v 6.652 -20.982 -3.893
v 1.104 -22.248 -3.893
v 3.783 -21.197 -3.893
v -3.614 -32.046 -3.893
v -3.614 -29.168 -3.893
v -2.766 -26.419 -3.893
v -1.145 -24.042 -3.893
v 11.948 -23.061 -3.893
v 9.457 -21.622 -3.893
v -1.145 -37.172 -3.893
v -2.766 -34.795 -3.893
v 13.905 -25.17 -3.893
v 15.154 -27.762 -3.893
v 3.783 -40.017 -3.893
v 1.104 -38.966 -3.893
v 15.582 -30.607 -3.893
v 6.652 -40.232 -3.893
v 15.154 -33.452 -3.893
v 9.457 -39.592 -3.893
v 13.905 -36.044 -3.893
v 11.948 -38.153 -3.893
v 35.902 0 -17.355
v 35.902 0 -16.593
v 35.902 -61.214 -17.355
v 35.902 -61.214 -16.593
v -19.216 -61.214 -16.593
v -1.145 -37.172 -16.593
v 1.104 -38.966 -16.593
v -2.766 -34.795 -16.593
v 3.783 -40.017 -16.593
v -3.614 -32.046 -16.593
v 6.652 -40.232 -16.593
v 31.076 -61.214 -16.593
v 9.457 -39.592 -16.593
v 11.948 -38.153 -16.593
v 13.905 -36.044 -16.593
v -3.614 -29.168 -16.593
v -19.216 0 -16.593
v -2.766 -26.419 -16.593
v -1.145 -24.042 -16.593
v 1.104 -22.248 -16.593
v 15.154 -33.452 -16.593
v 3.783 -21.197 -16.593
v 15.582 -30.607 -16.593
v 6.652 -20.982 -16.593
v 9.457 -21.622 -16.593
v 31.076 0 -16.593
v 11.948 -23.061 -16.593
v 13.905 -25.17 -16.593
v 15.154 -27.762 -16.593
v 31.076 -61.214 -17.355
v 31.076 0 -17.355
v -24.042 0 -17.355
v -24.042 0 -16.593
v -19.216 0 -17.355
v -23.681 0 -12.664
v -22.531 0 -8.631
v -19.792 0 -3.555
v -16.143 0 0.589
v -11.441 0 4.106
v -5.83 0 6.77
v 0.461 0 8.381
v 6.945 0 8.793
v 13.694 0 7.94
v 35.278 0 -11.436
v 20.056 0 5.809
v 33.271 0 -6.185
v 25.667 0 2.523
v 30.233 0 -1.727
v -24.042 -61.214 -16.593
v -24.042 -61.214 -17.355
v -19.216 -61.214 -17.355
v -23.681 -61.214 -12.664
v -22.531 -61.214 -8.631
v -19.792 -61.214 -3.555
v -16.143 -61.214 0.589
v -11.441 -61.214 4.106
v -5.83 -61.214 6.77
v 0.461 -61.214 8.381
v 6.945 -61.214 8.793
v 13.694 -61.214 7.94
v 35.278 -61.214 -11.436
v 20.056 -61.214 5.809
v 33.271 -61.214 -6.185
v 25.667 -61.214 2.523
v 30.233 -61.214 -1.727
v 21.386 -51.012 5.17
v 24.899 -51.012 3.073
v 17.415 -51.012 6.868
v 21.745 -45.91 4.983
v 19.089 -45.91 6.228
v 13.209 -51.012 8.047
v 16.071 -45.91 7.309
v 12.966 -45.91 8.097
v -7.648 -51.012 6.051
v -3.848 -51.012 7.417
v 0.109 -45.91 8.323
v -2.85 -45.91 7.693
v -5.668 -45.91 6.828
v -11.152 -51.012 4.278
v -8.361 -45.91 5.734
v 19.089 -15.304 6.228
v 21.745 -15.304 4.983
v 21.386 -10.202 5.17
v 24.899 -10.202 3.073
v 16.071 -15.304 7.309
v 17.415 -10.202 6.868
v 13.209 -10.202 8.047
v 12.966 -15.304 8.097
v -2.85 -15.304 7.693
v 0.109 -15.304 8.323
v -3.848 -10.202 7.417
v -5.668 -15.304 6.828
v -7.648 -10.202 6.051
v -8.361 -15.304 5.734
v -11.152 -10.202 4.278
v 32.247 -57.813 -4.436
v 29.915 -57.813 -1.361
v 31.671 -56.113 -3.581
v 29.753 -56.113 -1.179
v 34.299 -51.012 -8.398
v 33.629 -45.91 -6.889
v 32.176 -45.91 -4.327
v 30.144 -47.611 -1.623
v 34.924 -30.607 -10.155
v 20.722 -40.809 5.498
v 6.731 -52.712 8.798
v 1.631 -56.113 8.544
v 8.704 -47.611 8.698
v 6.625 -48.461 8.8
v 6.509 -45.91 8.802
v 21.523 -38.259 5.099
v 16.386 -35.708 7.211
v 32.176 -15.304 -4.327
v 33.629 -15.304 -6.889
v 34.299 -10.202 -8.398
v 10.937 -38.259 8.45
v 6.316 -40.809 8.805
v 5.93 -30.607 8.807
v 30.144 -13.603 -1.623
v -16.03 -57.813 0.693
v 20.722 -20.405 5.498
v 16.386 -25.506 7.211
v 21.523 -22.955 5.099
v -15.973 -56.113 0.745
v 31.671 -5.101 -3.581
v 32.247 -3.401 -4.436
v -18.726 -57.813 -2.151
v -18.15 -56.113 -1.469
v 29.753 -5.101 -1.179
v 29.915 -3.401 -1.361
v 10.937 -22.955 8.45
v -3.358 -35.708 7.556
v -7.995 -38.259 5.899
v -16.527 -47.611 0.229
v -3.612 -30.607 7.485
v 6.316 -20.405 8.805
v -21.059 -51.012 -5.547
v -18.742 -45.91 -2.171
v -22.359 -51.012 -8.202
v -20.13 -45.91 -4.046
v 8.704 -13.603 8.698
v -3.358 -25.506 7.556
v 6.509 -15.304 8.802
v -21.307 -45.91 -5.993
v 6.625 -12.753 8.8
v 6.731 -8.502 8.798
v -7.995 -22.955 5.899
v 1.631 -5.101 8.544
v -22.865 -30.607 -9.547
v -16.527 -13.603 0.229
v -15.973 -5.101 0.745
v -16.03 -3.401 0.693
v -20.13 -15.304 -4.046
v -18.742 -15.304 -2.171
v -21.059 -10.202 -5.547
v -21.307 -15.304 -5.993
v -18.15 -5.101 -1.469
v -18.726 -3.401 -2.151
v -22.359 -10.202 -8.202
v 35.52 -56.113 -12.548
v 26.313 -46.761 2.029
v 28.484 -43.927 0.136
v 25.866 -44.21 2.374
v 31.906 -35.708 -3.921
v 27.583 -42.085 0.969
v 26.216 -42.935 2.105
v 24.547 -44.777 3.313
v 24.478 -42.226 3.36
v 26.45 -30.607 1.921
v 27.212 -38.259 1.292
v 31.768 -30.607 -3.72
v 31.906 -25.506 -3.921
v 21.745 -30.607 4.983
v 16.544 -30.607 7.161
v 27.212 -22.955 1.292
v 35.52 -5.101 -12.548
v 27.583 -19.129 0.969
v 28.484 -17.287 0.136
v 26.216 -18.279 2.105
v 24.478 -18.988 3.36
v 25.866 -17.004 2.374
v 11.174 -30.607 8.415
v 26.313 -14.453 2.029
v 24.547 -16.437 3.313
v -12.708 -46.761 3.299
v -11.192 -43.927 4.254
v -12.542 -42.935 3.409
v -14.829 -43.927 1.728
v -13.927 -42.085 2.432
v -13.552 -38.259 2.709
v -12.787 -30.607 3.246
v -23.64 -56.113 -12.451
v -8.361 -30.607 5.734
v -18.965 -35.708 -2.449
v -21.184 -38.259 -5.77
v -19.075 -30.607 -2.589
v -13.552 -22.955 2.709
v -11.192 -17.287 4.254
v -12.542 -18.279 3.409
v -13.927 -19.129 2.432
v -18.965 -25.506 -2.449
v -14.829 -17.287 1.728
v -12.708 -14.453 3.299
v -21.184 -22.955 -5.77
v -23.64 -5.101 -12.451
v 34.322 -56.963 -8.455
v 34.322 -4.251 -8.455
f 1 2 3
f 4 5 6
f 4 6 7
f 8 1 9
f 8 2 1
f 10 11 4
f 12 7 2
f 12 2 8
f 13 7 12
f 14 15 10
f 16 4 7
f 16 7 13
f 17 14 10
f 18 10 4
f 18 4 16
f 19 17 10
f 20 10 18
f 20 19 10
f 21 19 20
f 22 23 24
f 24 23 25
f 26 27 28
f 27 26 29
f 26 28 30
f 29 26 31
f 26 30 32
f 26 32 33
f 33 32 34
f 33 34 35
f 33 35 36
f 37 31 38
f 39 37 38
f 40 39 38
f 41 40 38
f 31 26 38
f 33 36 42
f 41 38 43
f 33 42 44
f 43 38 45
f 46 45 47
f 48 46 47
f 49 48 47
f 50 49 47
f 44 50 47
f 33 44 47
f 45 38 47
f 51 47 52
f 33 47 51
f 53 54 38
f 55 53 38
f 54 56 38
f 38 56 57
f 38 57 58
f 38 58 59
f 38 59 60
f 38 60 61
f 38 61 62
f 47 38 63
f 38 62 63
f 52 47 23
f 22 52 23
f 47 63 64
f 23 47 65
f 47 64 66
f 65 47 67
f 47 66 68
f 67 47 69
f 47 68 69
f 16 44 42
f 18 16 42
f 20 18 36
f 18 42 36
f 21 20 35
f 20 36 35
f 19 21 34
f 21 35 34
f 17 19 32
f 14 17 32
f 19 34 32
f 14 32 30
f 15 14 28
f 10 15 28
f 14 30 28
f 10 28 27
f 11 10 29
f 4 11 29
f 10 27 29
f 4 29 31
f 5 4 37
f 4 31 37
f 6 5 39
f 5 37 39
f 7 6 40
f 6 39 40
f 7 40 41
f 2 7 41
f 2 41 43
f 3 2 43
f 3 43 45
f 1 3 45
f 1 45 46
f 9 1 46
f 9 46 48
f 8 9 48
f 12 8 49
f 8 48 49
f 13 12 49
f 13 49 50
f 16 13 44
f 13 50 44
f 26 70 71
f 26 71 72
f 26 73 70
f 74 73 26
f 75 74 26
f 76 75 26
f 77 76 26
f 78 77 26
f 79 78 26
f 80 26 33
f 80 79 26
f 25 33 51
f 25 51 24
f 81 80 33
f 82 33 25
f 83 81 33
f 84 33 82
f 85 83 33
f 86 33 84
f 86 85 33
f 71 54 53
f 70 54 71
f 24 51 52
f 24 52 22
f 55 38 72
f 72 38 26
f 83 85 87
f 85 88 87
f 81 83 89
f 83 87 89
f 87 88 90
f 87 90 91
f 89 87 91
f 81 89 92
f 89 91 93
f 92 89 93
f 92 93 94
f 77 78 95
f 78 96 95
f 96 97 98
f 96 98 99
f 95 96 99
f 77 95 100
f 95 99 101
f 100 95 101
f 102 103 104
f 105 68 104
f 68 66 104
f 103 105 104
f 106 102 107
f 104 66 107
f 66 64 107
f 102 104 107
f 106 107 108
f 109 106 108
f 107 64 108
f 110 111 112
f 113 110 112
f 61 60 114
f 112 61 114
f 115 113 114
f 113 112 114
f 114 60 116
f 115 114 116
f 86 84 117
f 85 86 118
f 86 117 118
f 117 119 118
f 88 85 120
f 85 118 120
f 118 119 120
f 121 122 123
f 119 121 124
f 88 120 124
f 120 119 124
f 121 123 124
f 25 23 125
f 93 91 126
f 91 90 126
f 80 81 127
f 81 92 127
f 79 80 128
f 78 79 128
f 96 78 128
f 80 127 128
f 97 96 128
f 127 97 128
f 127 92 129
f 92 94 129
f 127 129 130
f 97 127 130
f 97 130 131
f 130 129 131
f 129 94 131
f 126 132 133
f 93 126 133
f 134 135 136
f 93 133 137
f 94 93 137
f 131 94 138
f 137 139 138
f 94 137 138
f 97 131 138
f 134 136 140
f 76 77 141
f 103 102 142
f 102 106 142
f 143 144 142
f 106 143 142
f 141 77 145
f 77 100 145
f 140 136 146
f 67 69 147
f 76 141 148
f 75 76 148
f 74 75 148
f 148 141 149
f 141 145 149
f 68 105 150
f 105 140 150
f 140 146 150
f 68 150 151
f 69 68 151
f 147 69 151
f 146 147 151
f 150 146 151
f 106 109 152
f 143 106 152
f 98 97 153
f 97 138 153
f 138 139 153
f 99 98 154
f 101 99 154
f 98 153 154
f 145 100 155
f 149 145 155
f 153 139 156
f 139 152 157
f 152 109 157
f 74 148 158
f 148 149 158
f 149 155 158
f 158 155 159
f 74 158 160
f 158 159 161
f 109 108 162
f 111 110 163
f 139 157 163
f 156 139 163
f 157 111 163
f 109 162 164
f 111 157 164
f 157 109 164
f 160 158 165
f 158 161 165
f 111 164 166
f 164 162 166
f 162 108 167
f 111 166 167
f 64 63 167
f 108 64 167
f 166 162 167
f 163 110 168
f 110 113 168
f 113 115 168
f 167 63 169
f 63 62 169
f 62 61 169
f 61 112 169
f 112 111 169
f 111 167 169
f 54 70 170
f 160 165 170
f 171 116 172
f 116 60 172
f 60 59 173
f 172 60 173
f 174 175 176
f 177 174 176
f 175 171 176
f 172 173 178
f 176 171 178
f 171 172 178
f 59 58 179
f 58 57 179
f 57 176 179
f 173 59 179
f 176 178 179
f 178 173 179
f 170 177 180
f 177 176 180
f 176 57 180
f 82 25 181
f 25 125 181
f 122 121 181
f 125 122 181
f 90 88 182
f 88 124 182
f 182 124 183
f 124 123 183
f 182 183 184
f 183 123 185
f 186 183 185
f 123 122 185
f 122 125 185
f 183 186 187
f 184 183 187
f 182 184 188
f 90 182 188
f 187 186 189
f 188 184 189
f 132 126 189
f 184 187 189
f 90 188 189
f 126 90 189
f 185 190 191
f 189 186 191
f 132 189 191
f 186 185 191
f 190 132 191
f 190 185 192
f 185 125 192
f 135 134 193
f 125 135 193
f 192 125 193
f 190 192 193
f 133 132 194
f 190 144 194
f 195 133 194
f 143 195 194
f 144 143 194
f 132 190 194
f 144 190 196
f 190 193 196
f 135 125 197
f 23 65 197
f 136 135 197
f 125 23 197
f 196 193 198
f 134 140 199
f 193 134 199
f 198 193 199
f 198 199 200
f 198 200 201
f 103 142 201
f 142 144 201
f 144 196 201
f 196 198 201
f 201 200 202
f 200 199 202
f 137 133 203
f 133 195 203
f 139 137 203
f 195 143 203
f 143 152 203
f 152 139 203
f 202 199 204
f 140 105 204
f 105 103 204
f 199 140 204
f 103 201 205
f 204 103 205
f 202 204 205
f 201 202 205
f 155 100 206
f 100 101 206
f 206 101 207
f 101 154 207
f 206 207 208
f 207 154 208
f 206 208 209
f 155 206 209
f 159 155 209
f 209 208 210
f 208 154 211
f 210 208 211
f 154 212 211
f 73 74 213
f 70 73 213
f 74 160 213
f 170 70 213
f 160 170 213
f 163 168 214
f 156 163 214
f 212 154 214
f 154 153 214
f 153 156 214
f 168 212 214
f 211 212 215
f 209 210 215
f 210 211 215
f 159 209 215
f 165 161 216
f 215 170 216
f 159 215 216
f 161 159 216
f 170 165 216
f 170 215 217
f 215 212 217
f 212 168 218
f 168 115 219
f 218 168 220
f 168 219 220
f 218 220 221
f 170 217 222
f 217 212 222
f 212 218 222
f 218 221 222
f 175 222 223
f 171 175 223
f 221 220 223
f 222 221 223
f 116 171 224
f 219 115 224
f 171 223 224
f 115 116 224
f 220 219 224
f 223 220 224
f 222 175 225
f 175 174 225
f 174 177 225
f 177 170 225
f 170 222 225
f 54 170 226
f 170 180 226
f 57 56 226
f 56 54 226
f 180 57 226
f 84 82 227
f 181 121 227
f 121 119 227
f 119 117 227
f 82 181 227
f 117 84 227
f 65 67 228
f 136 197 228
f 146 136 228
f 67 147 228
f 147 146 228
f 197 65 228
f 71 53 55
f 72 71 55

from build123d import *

# Parameters (mm, degrees)
F1_DEPTH = 61.214
F2_W     = 4.826
F2_H     = 61.214
F3_DEPTH = 0.762
F4_R     = 9.652
F5_DEPTH = 12.7


with BuildPart() as f1:
    # F0 (on Front) → F1 (new body)
    with BuildSketch(Plane.XZ):
        with BuildLine():
            add(Edge.make_bspline(
                [(35.902390209, -16.5929342094), (35.902390209, 8.8070657906), (5.930390209, 8.8070657906), (-24.041609791, 8.8070657906), (-24.041609791, -16.5929342094)],
                knots=[3.1415926536, 3.1415926536, 3.1415926536, 4.7123889804, 4.7123889804, 6.2831853072, 6.2831853072, 6.2831853072], degree=2, weights=[1, 0.7071067812, 1, 0.7071067812, 1]))
            Line((-24.041609791, -16.5929342094), (35.902390209, -16.5929342094))
        make_face()
    extrude(amount=F1_DEPTH)

    # F2 (on face) → F3 (join)
    with BuildSketch(Plane(origin=(0, 0, -16.5929342094), x_dir=(1, 0, 0), z_dir=(0, 0, -1))):
        with Locations((-21.628609791, 30.607)):
            Rectangle(F2_W, F2_H)
        with Locations((33.489390209, 30.607)):
            Rectangle(F2_W, F2_H)
    extrude(amount=F3_DEPTH)

    # F4 (on face) → F5 (cut)
    with BuildSketch(Plane(origin=(0, 0, -16.5929342094), x_dir=(1, 0, 0), z_dir=(0, 0, -1))):
        with Locations((5.930390209, 30.607)):
            Circle(F4_R)
    extrude(amount=-F5_DEPTH, mode=Mode.SUBTRACT)


solid = f1.part
